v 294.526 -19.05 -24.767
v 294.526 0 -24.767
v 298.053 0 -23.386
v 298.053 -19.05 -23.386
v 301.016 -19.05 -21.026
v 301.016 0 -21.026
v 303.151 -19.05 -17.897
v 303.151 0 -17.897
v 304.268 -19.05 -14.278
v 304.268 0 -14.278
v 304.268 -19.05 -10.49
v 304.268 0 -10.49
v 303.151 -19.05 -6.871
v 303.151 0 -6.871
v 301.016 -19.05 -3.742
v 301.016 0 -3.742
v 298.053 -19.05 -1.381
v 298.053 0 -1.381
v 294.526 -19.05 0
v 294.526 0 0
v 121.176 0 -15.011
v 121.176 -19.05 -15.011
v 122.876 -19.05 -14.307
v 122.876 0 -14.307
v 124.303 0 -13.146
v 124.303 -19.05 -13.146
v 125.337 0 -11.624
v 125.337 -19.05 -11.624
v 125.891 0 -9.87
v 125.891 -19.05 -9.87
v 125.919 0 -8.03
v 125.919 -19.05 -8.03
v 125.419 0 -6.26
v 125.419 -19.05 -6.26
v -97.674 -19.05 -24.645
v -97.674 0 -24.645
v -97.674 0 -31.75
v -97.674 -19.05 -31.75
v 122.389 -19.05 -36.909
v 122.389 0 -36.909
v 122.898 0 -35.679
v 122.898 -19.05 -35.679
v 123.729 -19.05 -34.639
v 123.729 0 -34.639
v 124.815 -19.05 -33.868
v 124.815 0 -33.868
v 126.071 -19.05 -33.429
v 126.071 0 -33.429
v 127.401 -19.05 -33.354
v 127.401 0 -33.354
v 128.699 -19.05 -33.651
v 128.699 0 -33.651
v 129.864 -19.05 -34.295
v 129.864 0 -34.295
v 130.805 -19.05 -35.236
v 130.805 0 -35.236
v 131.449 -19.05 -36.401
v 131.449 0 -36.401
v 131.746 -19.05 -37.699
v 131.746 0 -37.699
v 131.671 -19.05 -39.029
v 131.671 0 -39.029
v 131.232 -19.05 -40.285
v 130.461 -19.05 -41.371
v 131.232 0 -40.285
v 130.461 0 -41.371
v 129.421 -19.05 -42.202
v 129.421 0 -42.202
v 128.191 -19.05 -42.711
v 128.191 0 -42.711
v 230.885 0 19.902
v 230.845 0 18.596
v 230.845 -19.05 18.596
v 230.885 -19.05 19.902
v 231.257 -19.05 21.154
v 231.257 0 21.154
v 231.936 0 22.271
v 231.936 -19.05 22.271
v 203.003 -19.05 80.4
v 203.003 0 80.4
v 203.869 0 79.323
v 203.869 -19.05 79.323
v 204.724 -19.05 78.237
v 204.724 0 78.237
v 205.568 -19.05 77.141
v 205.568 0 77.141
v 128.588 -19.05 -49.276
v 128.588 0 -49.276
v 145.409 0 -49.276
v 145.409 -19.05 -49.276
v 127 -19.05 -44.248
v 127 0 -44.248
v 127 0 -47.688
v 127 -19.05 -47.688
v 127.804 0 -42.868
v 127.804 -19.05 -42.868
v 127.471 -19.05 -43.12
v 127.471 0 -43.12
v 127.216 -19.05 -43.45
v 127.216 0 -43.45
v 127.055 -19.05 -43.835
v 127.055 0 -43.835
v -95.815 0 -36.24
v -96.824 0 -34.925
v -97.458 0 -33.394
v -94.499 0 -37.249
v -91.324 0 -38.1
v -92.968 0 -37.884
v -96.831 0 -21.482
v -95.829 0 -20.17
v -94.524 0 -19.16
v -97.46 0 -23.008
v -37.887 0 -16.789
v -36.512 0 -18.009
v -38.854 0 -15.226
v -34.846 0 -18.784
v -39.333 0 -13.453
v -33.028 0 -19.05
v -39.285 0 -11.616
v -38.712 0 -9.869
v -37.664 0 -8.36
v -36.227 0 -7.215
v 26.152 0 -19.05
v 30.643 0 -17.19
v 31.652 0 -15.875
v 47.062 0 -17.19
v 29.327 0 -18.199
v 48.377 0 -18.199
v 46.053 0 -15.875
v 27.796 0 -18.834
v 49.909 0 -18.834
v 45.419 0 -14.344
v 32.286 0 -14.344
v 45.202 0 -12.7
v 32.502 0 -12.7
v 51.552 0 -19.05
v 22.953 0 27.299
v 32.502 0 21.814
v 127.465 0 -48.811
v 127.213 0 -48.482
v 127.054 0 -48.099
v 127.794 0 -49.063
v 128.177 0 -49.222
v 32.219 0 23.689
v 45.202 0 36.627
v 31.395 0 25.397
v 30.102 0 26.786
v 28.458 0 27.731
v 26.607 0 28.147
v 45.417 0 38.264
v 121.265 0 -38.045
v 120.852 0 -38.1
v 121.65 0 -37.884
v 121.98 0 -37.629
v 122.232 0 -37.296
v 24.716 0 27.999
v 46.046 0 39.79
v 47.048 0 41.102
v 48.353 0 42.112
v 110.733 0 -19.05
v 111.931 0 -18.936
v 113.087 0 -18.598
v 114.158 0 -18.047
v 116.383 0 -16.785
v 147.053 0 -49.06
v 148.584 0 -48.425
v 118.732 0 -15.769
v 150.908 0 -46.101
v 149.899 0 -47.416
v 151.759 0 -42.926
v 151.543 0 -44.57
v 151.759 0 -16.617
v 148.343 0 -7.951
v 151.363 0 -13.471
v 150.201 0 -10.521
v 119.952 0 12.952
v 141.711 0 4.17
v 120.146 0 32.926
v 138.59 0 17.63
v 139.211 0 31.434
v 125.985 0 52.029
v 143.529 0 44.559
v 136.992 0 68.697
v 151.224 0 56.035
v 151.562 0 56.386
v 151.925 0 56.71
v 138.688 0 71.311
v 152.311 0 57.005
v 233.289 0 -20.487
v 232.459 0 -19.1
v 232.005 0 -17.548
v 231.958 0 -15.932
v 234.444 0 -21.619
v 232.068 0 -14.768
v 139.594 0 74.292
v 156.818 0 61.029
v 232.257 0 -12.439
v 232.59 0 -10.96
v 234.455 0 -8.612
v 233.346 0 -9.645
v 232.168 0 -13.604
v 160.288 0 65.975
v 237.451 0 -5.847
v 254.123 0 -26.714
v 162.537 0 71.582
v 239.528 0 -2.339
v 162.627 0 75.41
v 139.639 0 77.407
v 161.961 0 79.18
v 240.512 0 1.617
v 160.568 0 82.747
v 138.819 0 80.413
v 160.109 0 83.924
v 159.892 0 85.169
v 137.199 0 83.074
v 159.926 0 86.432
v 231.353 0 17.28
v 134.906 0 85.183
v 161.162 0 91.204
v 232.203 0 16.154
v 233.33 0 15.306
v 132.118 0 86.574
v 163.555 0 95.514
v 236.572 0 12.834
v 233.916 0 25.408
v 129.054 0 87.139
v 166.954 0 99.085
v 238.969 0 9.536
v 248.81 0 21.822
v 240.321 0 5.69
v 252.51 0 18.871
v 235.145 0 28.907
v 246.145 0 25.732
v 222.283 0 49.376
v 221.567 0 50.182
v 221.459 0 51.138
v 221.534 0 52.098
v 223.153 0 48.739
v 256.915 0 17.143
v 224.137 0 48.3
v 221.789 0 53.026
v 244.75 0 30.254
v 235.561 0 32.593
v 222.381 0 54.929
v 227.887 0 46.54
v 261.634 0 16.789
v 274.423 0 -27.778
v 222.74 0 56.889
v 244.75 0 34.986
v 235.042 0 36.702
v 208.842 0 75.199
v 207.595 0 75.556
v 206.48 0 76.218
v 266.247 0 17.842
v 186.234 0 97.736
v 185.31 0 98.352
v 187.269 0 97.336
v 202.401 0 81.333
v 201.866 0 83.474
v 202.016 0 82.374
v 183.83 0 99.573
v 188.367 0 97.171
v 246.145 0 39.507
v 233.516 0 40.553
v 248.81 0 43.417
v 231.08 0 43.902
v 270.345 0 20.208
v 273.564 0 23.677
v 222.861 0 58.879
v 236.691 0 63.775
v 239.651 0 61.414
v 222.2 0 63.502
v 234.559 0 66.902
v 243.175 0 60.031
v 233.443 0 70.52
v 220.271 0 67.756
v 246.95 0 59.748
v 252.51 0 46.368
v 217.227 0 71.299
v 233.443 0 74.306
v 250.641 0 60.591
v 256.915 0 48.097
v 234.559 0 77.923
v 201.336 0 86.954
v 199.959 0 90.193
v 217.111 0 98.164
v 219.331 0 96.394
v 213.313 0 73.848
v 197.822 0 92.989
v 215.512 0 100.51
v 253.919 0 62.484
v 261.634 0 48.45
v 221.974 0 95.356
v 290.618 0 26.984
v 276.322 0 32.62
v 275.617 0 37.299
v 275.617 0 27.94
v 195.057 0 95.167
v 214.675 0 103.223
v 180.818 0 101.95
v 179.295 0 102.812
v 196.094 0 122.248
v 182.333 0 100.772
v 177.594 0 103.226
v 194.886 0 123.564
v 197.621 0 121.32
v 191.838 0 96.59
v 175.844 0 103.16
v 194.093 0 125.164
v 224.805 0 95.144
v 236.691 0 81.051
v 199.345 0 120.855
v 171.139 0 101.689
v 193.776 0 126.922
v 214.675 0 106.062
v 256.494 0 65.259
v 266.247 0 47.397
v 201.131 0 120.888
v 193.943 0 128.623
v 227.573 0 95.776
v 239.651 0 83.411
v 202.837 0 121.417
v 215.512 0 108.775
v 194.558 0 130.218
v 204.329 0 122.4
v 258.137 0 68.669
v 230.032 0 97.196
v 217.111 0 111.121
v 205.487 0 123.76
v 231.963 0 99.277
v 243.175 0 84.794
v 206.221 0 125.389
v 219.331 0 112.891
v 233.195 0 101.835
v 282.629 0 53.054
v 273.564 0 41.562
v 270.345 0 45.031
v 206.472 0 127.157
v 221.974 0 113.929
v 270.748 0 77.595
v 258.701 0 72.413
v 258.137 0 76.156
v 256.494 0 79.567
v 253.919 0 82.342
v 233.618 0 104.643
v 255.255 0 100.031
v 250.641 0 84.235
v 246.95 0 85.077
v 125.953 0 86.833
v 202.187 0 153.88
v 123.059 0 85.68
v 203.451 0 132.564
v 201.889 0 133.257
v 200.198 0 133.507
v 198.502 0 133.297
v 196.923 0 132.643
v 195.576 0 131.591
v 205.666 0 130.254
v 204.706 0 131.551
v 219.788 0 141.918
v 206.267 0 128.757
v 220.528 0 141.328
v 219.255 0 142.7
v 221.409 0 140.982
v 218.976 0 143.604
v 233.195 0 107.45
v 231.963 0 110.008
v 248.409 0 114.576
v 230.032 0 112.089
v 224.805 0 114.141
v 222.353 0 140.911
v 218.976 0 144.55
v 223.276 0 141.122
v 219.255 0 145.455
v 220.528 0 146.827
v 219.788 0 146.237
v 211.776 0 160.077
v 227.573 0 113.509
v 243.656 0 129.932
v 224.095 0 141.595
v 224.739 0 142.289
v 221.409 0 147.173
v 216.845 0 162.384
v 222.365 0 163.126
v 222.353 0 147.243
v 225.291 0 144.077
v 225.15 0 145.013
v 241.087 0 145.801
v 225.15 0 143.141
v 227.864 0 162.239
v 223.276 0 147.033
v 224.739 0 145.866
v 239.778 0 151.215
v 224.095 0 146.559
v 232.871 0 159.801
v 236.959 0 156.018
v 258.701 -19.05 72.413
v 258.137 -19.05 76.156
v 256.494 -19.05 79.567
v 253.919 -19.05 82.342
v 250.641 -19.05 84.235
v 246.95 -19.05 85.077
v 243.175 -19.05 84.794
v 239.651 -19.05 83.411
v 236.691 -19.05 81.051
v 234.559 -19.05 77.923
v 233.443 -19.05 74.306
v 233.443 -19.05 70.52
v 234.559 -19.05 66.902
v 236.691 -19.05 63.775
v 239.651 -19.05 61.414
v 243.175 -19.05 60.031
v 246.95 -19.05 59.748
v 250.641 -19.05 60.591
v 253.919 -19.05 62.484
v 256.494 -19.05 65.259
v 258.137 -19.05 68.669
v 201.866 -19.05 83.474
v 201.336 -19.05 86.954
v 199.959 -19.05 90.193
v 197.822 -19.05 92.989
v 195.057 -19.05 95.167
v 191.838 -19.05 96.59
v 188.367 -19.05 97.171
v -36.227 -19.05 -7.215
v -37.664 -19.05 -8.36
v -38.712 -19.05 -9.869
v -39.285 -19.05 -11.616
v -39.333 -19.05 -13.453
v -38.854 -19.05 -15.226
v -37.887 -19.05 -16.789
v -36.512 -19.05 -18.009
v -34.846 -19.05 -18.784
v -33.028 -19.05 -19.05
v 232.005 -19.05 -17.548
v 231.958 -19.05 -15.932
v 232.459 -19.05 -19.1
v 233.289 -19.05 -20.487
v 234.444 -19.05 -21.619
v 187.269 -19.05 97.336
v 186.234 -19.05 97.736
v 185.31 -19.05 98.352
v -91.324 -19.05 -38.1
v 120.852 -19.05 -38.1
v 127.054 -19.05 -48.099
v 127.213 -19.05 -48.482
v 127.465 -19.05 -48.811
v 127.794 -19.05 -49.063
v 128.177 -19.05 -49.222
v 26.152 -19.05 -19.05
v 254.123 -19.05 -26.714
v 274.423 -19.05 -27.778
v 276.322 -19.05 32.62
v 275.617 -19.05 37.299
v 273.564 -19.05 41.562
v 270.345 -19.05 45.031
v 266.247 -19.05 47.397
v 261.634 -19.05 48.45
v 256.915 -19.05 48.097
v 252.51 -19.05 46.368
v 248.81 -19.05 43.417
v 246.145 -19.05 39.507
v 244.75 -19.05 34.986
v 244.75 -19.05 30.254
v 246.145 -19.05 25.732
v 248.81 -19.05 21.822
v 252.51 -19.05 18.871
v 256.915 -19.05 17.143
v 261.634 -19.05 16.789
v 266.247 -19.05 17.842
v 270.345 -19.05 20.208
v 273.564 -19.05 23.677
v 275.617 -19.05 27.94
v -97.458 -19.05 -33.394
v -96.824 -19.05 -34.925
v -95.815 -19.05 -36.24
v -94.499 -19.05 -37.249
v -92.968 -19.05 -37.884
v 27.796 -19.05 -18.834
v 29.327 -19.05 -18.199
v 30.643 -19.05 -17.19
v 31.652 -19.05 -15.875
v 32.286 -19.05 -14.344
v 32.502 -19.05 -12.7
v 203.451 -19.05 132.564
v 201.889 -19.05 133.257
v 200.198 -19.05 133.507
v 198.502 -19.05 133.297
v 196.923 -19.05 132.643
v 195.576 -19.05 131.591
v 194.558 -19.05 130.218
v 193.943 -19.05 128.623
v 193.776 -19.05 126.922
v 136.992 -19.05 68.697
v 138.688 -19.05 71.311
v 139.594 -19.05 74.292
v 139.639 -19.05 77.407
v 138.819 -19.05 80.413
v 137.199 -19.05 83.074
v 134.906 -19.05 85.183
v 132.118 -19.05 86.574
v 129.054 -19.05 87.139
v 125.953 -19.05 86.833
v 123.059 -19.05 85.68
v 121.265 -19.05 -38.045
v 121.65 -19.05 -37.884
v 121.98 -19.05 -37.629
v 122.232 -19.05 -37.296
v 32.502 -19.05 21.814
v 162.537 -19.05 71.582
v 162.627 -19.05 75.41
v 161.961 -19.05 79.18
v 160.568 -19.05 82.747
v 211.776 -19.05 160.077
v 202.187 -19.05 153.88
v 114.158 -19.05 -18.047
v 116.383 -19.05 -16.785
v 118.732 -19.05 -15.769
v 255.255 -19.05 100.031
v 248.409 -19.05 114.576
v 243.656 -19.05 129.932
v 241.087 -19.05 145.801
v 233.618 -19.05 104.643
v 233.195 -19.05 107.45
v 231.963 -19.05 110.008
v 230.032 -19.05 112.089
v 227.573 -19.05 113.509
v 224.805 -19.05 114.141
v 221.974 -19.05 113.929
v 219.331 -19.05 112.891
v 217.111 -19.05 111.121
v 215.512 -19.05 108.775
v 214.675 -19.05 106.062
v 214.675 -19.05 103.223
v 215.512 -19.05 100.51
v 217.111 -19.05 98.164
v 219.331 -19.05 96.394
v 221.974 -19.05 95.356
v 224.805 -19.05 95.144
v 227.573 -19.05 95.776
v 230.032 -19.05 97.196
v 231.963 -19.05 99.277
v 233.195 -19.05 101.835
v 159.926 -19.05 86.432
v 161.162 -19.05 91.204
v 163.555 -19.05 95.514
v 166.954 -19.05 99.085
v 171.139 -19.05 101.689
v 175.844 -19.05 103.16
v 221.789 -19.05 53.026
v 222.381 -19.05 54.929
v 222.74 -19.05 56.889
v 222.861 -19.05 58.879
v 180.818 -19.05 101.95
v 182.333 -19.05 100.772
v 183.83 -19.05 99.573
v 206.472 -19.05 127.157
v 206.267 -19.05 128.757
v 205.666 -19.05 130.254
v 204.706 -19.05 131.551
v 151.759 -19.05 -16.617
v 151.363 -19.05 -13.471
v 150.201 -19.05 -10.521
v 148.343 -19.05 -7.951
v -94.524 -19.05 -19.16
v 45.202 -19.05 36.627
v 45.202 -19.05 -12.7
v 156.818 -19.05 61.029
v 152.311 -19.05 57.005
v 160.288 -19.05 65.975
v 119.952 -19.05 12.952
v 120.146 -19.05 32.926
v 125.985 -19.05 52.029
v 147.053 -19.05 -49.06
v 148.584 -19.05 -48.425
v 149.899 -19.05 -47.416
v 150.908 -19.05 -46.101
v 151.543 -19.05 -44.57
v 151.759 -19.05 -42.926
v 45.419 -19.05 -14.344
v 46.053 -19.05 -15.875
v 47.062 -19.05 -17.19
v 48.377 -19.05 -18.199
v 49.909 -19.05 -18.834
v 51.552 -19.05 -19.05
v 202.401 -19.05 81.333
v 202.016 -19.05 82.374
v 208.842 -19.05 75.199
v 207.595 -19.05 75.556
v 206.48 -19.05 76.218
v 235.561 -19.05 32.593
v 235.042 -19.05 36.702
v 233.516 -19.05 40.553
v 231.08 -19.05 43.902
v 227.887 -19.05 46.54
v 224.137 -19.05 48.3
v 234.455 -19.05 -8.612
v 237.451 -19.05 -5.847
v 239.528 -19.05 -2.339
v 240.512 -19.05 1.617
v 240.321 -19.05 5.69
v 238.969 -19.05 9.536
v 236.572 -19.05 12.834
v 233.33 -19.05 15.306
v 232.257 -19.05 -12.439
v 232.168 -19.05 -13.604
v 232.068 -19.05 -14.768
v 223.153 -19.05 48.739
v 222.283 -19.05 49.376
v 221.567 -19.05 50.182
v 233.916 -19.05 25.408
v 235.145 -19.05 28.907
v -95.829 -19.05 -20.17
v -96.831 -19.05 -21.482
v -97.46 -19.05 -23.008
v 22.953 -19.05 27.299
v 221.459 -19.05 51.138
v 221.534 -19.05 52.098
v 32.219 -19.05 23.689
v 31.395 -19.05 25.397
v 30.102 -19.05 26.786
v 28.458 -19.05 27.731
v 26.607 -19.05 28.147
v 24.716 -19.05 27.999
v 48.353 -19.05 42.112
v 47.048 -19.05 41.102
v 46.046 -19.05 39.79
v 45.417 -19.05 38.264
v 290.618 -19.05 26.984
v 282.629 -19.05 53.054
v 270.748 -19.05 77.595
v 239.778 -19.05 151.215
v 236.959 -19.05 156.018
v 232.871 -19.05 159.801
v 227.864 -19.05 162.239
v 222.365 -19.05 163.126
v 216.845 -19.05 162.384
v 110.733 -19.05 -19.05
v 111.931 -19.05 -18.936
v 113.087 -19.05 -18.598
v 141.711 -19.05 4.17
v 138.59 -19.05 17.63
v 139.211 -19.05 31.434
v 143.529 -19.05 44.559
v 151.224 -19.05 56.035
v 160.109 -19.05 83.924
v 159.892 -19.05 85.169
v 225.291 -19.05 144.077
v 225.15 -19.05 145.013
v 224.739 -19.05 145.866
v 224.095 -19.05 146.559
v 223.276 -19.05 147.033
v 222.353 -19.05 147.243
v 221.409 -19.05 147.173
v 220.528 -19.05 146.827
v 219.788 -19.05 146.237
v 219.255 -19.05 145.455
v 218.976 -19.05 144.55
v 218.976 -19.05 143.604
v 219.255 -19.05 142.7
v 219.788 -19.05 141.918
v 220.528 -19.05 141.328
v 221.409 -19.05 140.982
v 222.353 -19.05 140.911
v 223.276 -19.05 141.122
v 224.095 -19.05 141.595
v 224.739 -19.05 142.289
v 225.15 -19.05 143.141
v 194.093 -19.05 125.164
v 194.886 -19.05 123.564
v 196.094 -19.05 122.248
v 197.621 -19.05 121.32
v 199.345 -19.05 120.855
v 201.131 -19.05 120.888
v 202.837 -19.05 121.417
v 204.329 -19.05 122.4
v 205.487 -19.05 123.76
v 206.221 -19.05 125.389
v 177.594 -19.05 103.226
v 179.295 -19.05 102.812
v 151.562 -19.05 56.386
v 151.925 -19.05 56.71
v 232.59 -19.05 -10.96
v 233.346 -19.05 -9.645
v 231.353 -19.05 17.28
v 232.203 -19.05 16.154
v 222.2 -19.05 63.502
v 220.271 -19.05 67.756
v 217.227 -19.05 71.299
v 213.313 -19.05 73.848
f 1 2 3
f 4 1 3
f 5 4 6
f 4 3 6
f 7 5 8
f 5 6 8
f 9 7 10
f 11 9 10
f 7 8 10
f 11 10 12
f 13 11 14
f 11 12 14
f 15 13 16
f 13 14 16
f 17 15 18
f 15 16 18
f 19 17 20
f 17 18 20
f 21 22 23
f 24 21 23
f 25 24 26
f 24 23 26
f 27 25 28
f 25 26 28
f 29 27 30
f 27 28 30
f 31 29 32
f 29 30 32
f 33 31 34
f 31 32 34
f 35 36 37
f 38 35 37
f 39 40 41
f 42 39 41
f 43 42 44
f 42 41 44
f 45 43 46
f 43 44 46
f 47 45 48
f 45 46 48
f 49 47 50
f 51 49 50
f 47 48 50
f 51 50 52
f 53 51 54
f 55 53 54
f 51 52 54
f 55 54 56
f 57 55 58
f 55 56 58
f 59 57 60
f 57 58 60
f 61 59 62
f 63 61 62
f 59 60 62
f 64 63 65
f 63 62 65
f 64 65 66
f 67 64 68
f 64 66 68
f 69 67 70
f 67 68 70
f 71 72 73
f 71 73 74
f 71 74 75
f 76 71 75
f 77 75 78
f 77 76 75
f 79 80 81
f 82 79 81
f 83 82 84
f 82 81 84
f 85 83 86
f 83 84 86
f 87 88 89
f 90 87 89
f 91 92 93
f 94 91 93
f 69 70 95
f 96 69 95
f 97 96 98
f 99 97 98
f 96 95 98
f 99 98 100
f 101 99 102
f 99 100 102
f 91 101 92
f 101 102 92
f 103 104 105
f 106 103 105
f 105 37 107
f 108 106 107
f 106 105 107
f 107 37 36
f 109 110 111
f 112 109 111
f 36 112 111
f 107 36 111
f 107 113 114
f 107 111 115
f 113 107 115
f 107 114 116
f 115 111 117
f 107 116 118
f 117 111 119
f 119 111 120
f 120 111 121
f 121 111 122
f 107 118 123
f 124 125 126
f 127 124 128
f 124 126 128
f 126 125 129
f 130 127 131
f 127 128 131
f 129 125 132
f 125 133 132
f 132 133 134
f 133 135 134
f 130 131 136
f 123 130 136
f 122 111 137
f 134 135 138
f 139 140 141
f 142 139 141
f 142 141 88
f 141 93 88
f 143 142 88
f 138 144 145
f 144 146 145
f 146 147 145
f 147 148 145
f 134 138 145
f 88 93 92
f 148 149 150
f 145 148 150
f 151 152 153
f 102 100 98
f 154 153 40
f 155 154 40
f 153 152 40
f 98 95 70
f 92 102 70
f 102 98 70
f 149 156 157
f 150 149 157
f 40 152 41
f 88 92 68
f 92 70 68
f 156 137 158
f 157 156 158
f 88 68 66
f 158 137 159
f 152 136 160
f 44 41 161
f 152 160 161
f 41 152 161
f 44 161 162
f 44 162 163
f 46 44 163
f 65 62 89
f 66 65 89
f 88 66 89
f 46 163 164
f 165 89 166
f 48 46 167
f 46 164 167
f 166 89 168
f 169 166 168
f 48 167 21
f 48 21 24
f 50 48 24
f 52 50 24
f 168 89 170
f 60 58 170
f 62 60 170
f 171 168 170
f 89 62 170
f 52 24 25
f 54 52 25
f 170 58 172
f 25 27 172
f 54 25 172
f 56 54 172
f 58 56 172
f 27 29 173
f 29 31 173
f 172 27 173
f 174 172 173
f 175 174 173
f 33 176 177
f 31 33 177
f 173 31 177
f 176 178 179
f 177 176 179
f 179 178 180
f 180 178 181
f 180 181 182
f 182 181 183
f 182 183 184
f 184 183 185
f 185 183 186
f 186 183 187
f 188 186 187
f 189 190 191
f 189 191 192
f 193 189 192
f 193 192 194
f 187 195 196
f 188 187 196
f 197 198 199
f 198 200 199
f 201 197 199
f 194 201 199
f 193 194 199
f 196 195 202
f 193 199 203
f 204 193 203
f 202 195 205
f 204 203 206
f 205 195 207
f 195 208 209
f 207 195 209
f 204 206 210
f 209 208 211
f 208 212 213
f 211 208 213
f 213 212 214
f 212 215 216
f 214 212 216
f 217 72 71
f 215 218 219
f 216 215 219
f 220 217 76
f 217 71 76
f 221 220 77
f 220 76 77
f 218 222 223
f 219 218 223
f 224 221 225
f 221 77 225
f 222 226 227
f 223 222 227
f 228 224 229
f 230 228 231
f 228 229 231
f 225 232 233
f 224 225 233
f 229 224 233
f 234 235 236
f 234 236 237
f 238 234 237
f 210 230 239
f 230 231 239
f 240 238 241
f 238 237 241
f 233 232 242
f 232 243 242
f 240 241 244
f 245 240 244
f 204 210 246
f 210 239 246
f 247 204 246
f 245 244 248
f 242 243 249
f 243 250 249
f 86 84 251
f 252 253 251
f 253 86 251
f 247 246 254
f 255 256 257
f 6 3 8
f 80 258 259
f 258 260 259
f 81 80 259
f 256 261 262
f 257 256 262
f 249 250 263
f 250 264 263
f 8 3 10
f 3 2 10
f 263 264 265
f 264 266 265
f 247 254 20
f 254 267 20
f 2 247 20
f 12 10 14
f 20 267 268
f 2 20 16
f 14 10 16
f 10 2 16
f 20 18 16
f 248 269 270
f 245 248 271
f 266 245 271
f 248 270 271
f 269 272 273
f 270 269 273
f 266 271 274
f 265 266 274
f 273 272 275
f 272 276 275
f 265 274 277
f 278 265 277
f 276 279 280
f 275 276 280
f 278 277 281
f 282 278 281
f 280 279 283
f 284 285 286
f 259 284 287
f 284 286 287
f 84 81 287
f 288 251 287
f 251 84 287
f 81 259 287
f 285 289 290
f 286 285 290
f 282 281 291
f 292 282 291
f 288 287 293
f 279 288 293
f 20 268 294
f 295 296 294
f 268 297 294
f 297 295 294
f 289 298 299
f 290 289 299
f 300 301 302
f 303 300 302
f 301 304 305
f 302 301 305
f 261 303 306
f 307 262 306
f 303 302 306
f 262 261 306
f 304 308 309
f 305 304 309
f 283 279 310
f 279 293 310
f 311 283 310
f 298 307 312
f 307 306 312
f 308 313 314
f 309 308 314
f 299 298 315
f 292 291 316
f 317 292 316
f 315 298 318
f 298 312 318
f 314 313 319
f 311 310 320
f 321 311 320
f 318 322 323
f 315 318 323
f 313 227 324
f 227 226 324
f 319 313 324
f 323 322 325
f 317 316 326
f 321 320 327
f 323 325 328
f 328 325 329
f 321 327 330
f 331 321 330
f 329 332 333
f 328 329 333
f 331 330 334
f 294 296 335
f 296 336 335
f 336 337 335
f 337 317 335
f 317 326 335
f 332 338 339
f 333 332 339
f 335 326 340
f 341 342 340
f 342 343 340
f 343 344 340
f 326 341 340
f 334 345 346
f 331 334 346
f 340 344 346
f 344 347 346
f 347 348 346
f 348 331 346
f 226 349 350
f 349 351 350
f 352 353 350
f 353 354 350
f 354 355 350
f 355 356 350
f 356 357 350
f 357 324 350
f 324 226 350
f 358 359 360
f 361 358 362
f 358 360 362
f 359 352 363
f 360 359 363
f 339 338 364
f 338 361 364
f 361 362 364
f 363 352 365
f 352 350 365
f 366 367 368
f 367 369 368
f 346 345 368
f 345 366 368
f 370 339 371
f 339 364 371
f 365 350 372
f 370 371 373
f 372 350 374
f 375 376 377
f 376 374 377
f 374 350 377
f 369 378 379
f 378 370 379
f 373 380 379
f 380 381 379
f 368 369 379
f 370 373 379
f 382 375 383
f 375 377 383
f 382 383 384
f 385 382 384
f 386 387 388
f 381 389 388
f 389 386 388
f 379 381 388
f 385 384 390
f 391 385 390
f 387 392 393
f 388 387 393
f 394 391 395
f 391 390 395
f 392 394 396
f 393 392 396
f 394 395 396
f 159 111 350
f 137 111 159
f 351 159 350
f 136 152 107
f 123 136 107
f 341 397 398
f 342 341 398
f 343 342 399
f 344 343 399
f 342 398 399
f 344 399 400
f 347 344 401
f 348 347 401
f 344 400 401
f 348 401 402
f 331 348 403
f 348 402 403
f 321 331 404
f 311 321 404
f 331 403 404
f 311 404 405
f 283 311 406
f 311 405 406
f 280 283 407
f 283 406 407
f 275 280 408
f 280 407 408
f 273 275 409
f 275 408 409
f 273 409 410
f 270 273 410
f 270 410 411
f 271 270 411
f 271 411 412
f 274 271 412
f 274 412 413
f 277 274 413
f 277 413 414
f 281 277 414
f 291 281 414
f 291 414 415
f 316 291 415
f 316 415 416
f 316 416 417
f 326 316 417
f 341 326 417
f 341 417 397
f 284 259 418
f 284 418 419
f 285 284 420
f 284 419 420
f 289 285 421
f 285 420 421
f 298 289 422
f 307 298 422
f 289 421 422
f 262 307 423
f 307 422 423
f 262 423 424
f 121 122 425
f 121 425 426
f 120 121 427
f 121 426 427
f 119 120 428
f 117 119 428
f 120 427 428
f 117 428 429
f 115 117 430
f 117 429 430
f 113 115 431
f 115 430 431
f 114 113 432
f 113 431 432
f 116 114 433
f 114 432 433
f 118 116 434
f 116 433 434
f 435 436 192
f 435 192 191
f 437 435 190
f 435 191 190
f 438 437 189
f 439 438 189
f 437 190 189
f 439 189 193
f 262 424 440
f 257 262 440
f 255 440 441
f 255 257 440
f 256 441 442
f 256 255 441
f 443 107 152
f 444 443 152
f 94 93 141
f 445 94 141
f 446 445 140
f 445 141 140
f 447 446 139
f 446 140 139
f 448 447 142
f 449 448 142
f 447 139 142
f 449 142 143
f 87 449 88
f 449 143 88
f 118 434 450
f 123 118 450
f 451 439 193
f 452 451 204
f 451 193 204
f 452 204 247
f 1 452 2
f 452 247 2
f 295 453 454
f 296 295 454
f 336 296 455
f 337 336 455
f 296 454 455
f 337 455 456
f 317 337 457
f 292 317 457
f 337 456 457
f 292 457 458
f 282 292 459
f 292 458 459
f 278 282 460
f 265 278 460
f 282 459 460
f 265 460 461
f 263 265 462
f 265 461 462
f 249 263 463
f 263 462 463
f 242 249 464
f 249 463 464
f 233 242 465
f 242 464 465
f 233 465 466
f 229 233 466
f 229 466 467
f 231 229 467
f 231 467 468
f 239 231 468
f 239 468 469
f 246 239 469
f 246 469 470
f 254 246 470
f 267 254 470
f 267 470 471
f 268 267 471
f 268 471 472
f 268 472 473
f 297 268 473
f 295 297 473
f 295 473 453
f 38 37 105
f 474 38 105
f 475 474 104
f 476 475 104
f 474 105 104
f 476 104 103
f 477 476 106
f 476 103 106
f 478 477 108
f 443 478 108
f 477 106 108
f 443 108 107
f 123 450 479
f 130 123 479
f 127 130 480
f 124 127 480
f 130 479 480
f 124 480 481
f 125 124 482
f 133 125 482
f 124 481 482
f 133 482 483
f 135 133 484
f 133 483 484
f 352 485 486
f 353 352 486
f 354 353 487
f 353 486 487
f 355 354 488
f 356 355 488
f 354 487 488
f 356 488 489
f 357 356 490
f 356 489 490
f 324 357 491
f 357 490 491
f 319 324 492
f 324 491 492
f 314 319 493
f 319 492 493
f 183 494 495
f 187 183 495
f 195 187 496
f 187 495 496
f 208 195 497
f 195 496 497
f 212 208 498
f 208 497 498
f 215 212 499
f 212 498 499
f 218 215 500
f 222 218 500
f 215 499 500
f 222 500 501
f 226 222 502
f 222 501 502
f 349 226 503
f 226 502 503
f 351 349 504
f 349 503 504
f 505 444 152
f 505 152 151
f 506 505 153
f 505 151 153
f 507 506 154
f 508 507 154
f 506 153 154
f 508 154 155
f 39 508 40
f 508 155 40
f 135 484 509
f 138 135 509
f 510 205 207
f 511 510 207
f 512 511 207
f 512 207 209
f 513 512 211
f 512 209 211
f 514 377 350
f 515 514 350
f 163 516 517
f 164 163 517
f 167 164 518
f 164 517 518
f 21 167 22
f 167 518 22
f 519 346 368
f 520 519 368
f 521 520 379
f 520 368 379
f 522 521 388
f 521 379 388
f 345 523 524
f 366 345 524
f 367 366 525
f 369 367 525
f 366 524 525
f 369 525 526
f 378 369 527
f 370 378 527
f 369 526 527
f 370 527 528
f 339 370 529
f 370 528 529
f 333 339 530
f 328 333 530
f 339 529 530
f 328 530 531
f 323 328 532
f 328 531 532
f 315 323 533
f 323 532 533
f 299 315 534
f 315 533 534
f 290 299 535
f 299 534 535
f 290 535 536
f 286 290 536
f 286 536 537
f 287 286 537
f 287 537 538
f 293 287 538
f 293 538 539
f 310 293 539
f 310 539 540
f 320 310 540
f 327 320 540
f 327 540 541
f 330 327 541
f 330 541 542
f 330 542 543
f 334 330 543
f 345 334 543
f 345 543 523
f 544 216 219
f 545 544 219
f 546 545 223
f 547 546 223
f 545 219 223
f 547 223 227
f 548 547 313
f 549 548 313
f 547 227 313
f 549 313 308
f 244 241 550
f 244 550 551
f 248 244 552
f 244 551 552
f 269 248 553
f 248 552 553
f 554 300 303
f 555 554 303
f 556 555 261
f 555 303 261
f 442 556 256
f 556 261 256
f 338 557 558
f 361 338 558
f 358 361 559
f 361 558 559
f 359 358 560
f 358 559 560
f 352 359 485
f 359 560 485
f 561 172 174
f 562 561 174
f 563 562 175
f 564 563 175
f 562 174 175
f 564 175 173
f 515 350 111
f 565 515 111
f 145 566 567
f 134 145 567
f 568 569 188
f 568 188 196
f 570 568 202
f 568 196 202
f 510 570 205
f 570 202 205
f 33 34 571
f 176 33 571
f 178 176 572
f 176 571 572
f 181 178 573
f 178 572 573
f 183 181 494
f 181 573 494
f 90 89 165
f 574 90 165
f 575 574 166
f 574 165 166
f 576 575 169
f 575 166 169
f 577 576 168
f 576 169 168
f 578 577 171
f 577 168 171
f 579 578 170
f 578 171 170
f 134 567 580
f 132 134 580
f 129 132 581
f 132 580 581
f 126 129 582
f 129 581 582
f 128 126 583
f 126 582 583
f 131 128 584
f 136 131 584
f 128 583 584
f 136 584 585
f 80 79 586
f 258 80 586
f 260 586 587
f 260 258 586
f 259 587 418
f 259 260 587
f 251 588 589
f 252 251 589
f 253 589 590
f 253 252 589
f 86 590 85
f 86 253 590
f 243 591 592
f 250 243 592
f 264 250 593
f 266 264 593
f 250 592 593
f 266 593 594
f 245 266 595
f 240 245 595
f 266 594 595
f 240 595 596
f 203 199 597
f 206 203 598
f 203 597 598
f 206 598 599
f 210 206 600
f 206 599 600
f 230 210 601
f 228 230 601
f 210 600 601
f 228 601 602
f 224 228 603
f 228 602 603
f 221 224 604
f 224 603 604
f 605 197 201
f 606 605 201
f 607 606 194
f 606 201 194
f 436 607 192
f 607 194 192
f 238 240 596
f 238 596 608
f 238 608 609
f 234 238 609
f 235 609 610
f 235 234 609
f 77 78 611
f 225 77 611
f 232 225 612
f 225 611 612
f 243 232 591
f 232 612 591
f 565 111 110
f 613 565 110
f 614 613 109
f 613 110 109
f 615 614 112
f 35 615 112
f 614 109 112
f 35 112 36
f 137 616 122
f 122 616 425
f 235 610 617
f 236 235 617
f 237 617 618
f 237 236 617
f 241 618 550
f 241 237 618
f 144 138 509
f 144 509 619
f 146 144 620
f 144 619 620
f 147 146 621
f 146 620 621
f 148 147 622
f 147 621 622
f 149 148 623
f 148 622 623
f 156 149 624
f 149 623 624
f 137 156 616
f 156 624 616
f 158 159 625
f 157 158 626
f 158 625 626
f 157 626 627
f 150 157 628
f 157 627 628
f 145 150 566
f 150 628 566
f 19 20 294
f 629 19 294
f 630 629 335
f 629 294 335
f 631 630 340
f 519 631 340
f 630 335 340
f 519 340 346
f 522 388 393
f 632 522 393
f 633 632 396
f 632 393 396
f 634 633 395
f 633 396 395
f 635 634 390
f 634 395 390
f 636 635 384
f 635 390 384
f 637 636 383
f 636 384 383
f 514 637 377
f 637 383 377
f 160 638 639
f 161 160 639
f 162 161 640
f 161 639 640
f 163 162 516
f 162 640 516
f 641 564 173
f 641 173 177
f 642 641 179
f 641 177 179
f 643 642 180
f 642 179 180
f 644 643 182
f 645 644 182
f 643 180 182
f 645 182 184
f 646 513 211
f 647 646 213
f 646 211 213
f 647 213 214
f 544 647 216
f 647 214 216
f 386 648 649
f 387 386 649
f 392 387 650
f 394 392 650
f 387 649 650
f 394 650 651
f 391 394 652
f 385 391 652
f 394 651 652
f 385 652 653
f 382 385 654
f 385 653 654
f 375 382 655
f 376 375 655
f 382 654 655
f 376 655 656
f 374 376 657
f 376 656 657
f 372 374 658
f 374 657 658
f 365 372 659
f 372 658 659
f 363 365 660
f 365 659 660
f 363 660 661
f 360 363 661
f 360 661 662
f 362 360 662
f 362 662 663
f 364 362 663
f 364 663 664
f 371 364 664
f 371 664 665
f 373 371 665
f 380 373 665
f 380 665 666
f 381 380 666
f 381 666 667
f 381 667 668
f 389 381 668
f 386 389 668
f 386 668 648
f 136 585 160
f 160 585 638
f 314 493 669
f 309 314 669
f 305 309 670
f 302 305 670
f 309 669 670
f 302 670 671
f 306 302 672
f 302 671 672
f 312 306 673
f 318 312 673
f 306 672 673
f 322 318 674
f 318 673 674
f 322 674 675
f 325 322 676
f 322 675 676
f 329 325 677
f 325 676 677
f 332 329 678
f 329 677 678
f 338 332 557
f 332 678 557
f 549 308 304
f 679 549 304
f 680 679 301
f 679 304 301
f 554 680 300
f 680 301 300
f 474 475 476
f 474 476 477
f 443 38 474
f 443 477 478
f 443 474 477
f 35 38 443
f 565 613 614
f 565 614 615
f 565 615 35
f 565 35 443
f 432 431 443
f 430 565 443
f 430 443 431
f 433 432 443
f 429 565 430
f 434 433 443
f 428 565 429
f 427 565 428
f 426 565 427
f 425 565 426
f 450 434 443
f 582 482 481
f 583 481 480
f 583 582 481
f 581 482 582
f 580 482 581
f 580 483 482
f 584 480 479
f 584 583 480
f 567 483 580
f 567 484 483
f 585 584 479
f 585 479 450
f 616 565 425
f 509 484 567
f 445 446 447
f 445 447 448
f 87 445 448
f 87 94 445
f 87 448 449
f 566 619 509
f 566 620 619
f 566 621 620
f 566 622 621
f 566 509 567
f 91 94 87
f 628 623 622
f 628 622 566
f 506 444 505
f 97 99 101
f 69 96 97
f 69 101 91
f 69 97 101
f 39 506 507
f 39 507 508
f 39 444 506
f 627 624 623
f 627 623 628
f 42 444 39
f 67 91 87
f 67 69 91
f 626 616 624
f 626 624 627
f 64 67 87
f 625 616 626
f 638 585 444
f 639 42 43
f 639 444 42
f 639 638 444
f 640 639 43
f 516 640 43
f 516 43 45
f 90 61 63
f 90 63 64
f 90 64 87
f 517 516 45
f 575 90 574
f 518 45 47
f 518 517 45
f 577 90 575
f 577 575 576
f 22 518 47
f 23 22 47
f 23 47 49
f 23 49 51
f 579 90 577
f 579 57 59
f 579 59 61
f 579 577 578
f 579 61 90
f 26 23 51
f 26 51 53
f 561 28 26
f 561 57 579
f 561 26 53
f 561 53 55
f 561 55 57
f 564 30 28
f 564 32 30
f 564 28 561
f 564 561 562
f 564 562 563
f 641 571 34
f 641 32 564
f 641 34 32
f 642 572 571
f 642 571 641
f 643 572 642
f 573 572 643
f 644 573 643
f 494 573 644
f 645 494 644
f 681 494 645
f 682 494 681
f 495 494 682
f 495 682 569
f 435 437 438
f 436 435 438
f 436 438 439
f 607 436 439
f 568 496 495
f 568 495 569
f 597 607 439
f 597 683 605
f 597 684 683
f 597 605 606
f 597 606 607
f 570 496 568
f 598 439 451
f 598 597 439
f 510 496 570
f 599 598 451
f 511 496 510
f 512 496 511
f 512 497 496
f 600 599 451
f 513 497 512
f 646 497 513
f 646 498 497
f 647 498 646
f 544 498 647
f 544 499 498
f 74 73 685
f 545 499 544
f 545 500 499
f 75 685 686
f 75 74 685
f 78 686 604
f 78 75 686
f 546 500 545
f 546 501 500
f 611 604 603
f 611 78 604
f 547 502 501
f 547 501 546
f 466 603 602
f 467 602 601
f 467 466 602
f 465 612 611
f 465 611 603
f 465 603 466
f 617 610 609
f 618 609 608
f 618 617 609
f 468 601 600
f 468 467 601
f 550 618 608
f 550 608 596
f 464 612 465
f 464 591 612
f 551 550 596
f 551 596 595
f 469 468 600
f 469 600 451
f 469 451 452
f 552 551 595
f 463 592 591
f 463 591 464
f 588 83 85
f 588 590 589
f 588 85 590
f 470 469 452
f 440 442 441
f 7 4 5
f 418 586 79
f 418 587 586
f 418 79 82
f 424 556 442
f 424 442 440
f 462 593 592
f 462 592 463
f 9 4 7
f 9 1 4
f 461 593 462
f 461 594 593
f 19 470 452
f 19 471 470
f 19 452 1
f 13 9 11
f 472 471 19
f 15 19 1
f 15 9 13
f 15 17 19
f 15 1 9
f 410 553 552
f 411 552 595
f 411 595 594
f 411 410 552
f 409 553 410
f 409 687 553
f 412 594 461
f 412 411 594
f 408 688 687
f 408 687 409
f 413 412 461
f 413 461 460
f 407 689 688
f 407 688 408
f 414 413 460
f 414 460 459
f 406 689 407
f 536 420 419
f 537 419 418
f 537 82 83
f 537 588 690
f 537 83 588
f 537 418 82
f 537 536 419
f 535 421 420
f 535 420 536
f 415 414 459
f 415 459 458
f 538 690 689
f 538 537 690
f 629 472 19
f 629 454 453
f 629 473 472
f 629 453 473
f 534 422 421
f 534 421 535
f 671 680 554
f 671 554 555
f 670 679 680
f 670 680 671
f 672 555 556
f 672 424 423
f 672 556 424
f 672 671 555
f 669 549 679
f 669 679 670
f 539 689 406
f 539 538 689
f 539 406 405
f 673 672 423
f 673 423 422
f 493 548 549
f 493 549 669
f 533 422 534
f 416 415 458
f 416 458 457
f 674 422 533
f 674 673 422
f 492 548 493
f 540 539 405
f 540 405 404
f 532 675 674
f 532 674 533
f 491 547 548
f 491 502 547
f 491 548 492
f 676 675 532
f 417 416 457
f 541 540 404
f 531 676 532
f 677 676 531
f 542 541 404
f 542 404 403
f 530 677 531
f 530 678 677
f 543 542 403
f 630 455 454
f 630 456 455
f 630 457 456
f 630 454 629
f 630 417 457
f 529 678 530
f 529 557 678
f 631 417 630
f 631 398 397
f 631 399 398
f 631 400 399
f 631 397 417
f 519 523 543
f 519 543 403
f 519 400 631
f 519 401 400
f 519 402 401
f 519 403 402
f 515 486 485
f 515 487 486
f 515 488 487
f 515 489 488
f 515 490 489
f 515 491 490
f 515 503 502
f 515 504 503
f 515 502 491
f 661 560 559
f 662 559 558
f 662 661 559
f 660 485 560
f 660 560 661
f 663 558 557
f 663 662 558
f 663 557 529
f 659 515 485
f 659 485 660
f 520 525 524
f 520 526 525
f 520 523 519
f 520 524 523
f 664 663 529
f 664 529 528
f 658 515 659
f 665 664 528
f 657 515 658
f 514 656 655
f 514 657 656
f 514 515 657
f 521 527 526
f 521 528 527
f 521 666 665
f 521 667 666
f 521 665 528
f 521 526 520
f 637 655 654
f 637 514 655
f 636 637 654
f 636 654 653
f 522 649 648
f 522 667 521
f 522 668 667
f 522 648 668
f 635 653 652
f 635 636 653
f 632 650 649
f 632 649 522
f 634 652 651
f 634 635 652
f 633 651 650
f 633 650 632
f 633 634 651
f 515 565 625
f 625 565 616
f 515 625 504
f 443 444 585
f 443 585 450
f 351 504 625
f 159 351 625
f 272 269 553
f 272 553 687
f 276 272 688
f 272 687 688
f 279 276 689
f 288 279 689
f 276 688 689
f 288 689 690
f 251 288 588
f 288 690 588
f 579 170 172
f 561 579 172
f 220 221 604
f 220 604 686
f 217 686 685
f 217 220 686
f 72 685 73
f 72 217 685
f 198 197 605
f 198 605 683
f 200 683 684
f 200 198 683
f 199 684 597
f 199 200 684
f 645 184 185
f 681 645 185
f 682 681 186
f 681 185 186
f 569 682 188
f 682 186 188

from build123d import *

# Parameters (mm, degrees)
F1_DEPTH    = 19.05
F2_R        = 3.175
F2_R_2      = 9.525
F2_R_3      = 12.7
F2_R_4      = 15.875
F3_DEPTH    = 25.4
F5_DEPTH    = 25.4
F6_T1_DEPTH = 30.0603271211
F6_T3_DEPTH = 31.1986000008
F6_T5_DEPTH = 28.3963352446
F6_T7_DEPTH = 32.4334586234


# Not quite as in the source:
# - a fillet or chamfer that OpenCascade refuses, or shapes differently, is made with other operations: its cross-section is extruded or revolved along the edge and cut away or added


with BuildPart() as f1:
    # F0 (on Front) → F1 (new body)
    with BuildSketch(Plane.XZ):
        with BuildLine():
            ThreePointArc((-97.6744983316, -31.75), (-95.8146263921, -36.2401280605), (-91.3244983316, -38.1))
            Line((-91.3244983316, -38.1), (120.8516389379, -38.1))
            ThreePointArc((120.8516389379, -38.1), (121.8237801796, -37.7675289464), (122.3887292034, -36.909375))
            ThreePointArc((122.3887292034, -36.909375), (130.3675960454, -34.7324039546), (128.190625, -42.7112707966))
            ThreePointArc((128.190625, -42.7112707966), (127.3324710536, -43.2762198204), (127, -44.2483610621))
            Line((127, -44.2483610621), (127, -47.6885))
            ThreePointArc((127, -47.6885), (127.4649679849, -48.8110320151), (128.5875, -49.276))
            Line((128.5875, -49.276), (145.4092243424, -49.276))
            ThreePointArc((145.4092243424, -49.276), (149.8993524029, -47.4161280605), (151.7592243424, -42.926))
            Line((151.7592243424, -42.926), (151.7592243424, -16.6167677244))
            ThreePointArc((151.7592243424, -16.6167677244), (150.8744160327, -11.9593816205), (148.3432801973, -7.95095519))
            ThreePointArc((148.3432801973, -7.95095519), (138.4290547294, 24.5532823111), (151.2244431733, 56.0349493051))
            ThreePointArc((151.2244431733, 56.0349493051), (151.7400284969, 56.5513745002), (152.3114587754, 57.0052364228))
            ThreePointArc((152.3114587754, 57.0052364228), (158.6954603174, 63.4018980936), (162.5374758377, 71.5818536535))
            ThreePointArc((162.5374758377, 71.5818536535), (162.3873847727, 77.3115690897), (160.5681351866, 82.7468701164))
            ThreePointArc((160.5681351866, 82.7468701164), (159.9697528023, 84.5410858194), (159.9263668127, 86.4319557574))
            ThreePointArc((159.9263668127, 86.4319557574), (165.1411573537, 97.4071817121), (175.8442055157, 103.1599536687))
            ThreePointArc((175.8442055157, 103.1599536687), (178.4583890799, 103.0782041484), (180.8178773791, 101.9497301092))
            ThreePointArc((180.8178773791, 101.9497301092), (221.6873319491, 49.6461946462), (231.9580536588, -15.9318841175))
            ThreePointArc((231.9580536588, -15.9318841175), (232.4585750307, -19.0998901862), (234.443503066, -21.6191846886))
            ThreePointArc((234.443503066, -21.6191846886), (264.2459103293, -27.7561805118), (294.5264875889, -24.767395266))
            ThreePointArc((294.5264875889, -24.767395266), (304.4097460434, -12.383697633), (294.5264875889, 0))
            ThreePointArc((294.5264875889, 0), (282.6289913598, 53.0536935026), (255.2546977003, 100.031271744))
            ThreePointArc((255.2546977003, 100.031271744), (245.7643329114, 122.1712128334), (241.0873952711, 145.8010725364))
            ThreePointArc((241.0873952711, 145.8010725364), (230.45685595, 161.2038903493), (211.7757176902, 160.0768428105))
            Line((211.7757176902, 160.0768428105), (202.1868032782, 153.8799835291))
            Line((202.1868032782, 153.8799835291), (-94.5235117526, -19.159885704))
            ThreePointArc((-94.5235117526, -19.159885704), (-96.8306873596, -21.4822422795), (-97.6744983316, -24.6452127802))
            Line((-97.6744983316, -24.6452127802), (-97.6744983316, -31.75))
        make_face()
    extrude(amount=F1_DEPTH)

    # F2 (on face) → F3 (cut)
    with BuildSketch(Plane.XZ.offset(19.05)):
        with Locations((222.1155585436, 144.0771493407)):
            Circle(F2_R)
        with BuildLine():
            Line((203.4512059186, 132.5644525933), (193.776246746, 126.9220681353))
            ThreePointArc((193.776246746, 126.9220681353), (200.2394873385, 120.8083090531), (206.4718912023, 127.1572200738))
            ThreePointArc((206.4718912023, 127.1572200738), (205.6655203588, 130.254101695), (203.4512059186, 132.5644525933))
        make_face()
        with BuildLine():
            ThreePointArc((203.4512059186, 132.5644525933), (196.9228777813, 132.6425471499), (193.776246746, 126.9220681353))
            Line((193.776246746, 126.9220681353), (203.4512059186, 132.5644525933))
        make_face()
        with Locations((224.0934852203, 104.6425497844)):
            Circle(F2_R_2)
        with Locations((246.0011737906, 72.412781237)):
            Circle(F2_R_3)
        with Locations((260.4474416869, 32.6195944174)):
            Circle(F2_R_4)
        with BuildLine():
            ThreePointArc((-36.2271326674, -7.2146729239), (-39.1581407363, -14.3569057105), (-33.0281192464, -19.05))
            Line((-33.0281192464, -19.05), (26.1524232063, -19.05))
            ThreePointArc((26.1524232063, -19.05), (30.6425512669, -17.1901280605), (32.5024232063, -12.7))
            Line((32.5024232063, -12.7), (32.5024232063, 21.8137759235))
            ThreePointArc((32.5024232063, 21.8137759235), (29.315393707, 27.3199649515), (22.9534097853, 27.2991029996))
            Line((22.9534097853, 27.2991029996), (-36.2271326674, -7.2146729239))
        make_face()
        with BuildLine():
            ThreePointArc((125.4190243086, -6.2600999334), (120.1455601031, 32.9262812272), (136.9919967338, 68.6974912436))
            ThreePointArc((136.9919967338, 68.6974912436), (137.1991099249, 83.0744541178), (123.0586985781, 85.6799721664))
            Line((123.0586985781, 85.6799721664), (48.3534097853, 42.1122471873))
            ThreePointArc((48.3534097853, 42.1122471873), (46.0462341784, 39.7898906118), (45.2024232063, 36.6269201112))
            Line((45.2024232063, 36.6269201112), (45.2024232063, 36.5713226157))
            Line((45.2024232063, 36.5713226157), (45.2024232063, -12.7))
            ThreePointArc((45.2024232063, -12.7), (47.0622951458, -17.1901280605), (51.5524232063, -19.05))
            Line((51.5524232063, -19.05), (110.732965659, -19.05))
            ThreePointArc((110.732965659, -19.05), (112.5171616301, -18.7941894241), (114.1576044677, -18.0473684211))
            ThreePointArc((114.1576044677, -18.0473684211), (117.5440512909, -16.2454766636), (121.1758845472, -15.0107203351))
            ThreePointArc((121.1758845472, -15.0107203351), (125.336500367, -11.6241351048), (125.4190243086, -6.2600999334))
        make_face()
    extrude(amount=-F3_DEPTH, mode=Mode.SUBTRACT)

    # F4 (on face) → F5 (cut)
    with BuildSketch(Plane.XZ.offset(19.05)):
        with BuildLine():
            Line((205.7570372824, 42.3802169454), (212.9491877633, 45.8553555323))
            ThreePointArc((212.9491877633, 45.8553555323), (212.5656514739, 46.730082771), (212.1753107443, 47.6017948463))
            ThreePointArc((212.1753107443, 47.6017948463), (208.6337520482, 45.3996132397), (205.7570372824, 42.3802169454))
        make_face()
        with BuildLine():
            ThreePointArc((212.1753107443, 47.6017948463), (212.5656514739, 46.730082771), (212.9491877633, 45.8553555323))
            Line((212.9491877633, 45.8553555323), (205.7570372824, 42.3802169454))
            ThreePointArc((205.7570372824, 42.3802169454), (213.5341104331, 44.0137836863), (219.6469644258, 49.09162015))
            ThreePointArc((219.6469644258, 49.09162015), (215.8240199222, 48.7836130904), (212.1753107443, 47.6017948463))
        make_face()
        with BuildLine():
            ThreePointArc((205.7570372824, 42.3802169454), (208.6337520482, 45.3996132397), (212.1753107443, 47.6017948463))
            ThreePointArc((212.1753107443, 47.6017948463), (205.3746994644, 60.5221639094), (197.0859881764, 72.5422103192))
            Line((197.0859881764, 72.5422103192), (193.6454970545, 69.4190230989))
            ThreePointArc((193.6454970545, 69.4190230989), (191.2850857199, 52.1297449914), (205.7570372824, 42.3802169454))
        make_face()
        with BuildLine():
            ThreePointArc((197.0859881764, 72.5422103192), (205.3746994644, 60.5221639094), (212.1753107443, 47.6017948463))
            ThreePointArc((212.1753107443, 47.6017948463), (215.8240199222, 48.7836130904), (219.6469644258, 49.09162015))
            ThreePointArc((219.6469644258, 49.09162015), (222.0367215402, 53.7280102211), (222.8607258742, 58.8785508543))
            ThreePointArc((222.8607258742, 58.8785508543), (214.0841075429, 73.4647831759), (197.0859881764, 72.5422103192))
        make_face()
        with BuildLine():
            ThreePointArc((219.6469644258, 49.09162015), (213.5341104331, 44.0137836863), (205.7570372824, 42.3802169454))
            ThreePointArc((205.7570372824, 42.3802169454), (205.0900299154, 23.784029323), (222.1616065465, 16.3796816648))
            ThreePointArc((222.1616065465, 16.3796816648), (223.0725498981, 16.6422099505), (223.9991050166, 16.8427953515))
            ThreePointArc((223.9991050166, 16.8427953515), (232.3605019958, 22.823896366), (235.5613691058, 32.5932862411))
            ThreePointArc((235.5613691058, 32.5932862411), (230.9343591767, 44.0547793603), (219.6469644258, 49.09162015))
        make_face()
        with BuildLine():
            ThreePointArc((195.5812538731, 71.3904075622), (196.3170814503, 71.9879165163), (197.0859881764, 72.5422103192))
            ThreePointArc((197.0859881764, 72.5422103192), (187.8014437334, 83.1128874452), (177.3667262781, 92.5499766177))
            ThreePointArc((177.3667262781, 92.5499766177), (177.1387060987, 73.9342161605), (195.5812538731, 71.3904075622))
        make_face()
        with BuildLine():
            ThreePointArc((177.3667262781, 92.5499766177), (187.8014437334, 83.1128874452), (197.0859881764, 72.5422103192))
            ThreePointArc((197.0859881764, 72.5422103192), (200.6187749377, 77.3113358236), (201.8706292258, 83.1128874452))
            ThreePointArc((201.8706292258, 83.1128874452), (192.8578260854, 96.2420526102), (177.3667262781, 92.5499766177))
        make_face()
        with BuildLine():
            Line((193.6454970545, 69.4190230989), (197.0859881764, 72.5422103192))
            ThreePointArc((197.0859881764, 72.5422103192), (196.3530349145, 71.9409463118), (195.5812538731, 71.3904075622))
            ThreePointArc((195.5812538731, 71.3904075622), (194.5720627472, 70.4452814273), (193.6454970545, 69.4190230989))
        make_face()
        with BuildLine():
            ThreePointArc((195.5812538731, 71.3904075622), (196.3530349145, 71.9409463118), (197.0859881764, 72.5422103192))
            ThreePointArc((197.0859881764, 72.5422103192), (196.3170814503, 71.9879165163), (195.5812538731, 71.3904075622))
        make_face()
        with BuildLine():
            ThreePointArc((223.9991050166, 16.8427953515), (223.0725498981, 16.6422099505), (222.1616065465, 16.3796816648))
            ThreePointArc((222.1616065465, 16.3796816648), (223.0870059682, 16.5848525296), (223.9991050166, 16.8427953515))
        make_face()
        with BuildLine():
            ThreePointArc((223.9991050166, 16.8427953515), (223.0870059682, 16.5848525296), (222.1616065465, 16.3796816648))
            ThreePointArc((222.1616065465, 16.3796816648), (218.2420246677, -8.38309145), (240.5801356684, 2.9996521278))
            ThreePointArc((240.5801356684, 2.9996521278), (235.5276670104, 13.7996890697), (223.9991050166, 16.8427953515))
        make_face()
    extrude(amount=-F5_DEPTH, mode=Mode.SUBTRACT)

    # F6: fillet of radius 5.08 on 8 edges, made by hand

    # F6_s2 → F6_t1 (cut)
    with BuildSketch(Plane.XZ.offset(-5.5051635606)):
        with BuildLine():
            ThreePointArc((221.8713115401, 49.2200601176), (221.4599286068, 51.1151221825), (221.7886262098, 53.0262616419))
            ThreePointArc((221.7886262098, 53.0262616419), (221.4135293391, 52.1191653521), (220.9851854038, 51.2359650268))
            ThreePointArc((220.9851854038, 51.2359650268), (221.432449207, 50.2298590785), (221.8713115401, 49.2200601176))
        make_face()
        with BuildLine():
            ThreePointArc((208.8420945961, 75.1986750012), (207.0161625579, 75.8517204357), (205.5679730948, 77.1413883878))
            ThreePointArc((205.5679730948, 77.1413883878), (206.2316951899, 76.2628856448), (206.8880718736, 75.3788812682))
            ThreePointArc((206.8880718736, 75.3788812682), (207.8677630854, 75.3178364408), (208.8420945961, 75.1986750012))
        make_face()
    extrude(amount=F6_T1_DEPTH, mode=Mode.SUBTRACT)

    # F6_s4 → F6_t3 (cut)
    with BuildSketch(Plane.XZ.offset(-6.0743000004)):
        with BuildLine():
            ThreePointArc((224.1373418719, 48.2996925298), (222.3088529855, 49.3521578516), (221.0656189971, 51.0566883182))
            ThreePointArc((221.0656189971, 51.0566883182), (221.5569923707, 49.9456220571), (222.0381267809, 48.830083753))
            ThreePointArc((222.0381267809, 48.830083753), (223.0964388832, 48.5993395729), (224.1373418719, 48.2996925298))
        make_face()
        with BuildLine():
            ThreePointArc((230.8865844012, 18.2789289832), (230.9876985591, 20.3862568619), (231.9362009526, 22.2707722029))
            ThreePointArc((231.9362009526, 22.2707722029), (231.2315639977, 21.4481215212), (230.4744978403, 20.6734485479))
            ThreePointArc((230.4744978403, 20.6734485479), (230.6860466781, 19.4771362484), (230.8865844012, 18.2789289832))
        make_face()
    extrude(amount=F6_T3_DEPTH, mode=Mode.SUBTRACT)

    # F6_s6 → F6_t5 (cut)
    with BuildSketch(Plane.XZ.offset(-4.6731676223)):
        with BuildLine():
            ThreePointArc((203.002520704, 80.4003376681), (202.1795489166, 81.8431560004), (201.8659860021, 83.4743168145))
            ThreePointArc((201.8659860021, 83.4743168145), (201.8632603647, 82.657592546), (201.8131477205, 81.8424025787))
            ThreePointArc((201.8131477205, 81.8424025787), (202.4103850279, 81.1234739617), (203.002520704, 80.4003376681))
        make_face()
        with BuildLine():
            ThreePointArc((188.3671023799, 97.170697044), (186.7406676624, 97.5079171684), (185.3099539983, 98.3517570313))
            ThreePointArc((185.3099539983, 98.3517570313), (186.0244140953, 97.749181287), (186.7345928658, 97.1415655599))
            ThreePointArc((186.7345928658, 97.1415655599), (187.5504246675, 97.1798334481), (188.3671023799, 97.170697044))
        make_face()
    extrude(amount=F6_T5_DEPTH, mode=Mode.SUBTRACT)

    # F6_s8 → F6_t7 (cut)
    with BuildSketch(Plane.XZ.offset(-6.6917293117)):
        with BuildLine():
            ThreePointArc((232.2568768174, -12.4388497815), (232.9187668001, -10.2742241066), (234.4552271906, -8.6119990526))
            ThreePointArc((234.4552271906, -8.6119990526), (233.4629344096, -9.2319420298), (232.4225614415, -9.767290837))
            ThreePointArc((232.4225614415, -9.767290837), (232.3464860605, -11.1034899805), (232.2568768174, -12.4388497815))
        make_face()
        with BuildLine():
            ThreePointArc((233.3303189509, 15.3056746343), (231.6446289063, 16.816353864), (230.7824945926, 18.9093008502))
            ThreePointArc((230.7824945926, 18.9093008502), (230.9970416723, 17.5882462846), (231.1981934117, 16.2650858285))
            ThreePointArc((231.1981934117, 16.2650858285), (232.284220259, 15.829746943), (233.3303189509, 15.3056746343))
        make_face()
    extrude(amount=F6_T7_DEPTH, mode=Mode.SUBTRACT)


solid = f1.part
